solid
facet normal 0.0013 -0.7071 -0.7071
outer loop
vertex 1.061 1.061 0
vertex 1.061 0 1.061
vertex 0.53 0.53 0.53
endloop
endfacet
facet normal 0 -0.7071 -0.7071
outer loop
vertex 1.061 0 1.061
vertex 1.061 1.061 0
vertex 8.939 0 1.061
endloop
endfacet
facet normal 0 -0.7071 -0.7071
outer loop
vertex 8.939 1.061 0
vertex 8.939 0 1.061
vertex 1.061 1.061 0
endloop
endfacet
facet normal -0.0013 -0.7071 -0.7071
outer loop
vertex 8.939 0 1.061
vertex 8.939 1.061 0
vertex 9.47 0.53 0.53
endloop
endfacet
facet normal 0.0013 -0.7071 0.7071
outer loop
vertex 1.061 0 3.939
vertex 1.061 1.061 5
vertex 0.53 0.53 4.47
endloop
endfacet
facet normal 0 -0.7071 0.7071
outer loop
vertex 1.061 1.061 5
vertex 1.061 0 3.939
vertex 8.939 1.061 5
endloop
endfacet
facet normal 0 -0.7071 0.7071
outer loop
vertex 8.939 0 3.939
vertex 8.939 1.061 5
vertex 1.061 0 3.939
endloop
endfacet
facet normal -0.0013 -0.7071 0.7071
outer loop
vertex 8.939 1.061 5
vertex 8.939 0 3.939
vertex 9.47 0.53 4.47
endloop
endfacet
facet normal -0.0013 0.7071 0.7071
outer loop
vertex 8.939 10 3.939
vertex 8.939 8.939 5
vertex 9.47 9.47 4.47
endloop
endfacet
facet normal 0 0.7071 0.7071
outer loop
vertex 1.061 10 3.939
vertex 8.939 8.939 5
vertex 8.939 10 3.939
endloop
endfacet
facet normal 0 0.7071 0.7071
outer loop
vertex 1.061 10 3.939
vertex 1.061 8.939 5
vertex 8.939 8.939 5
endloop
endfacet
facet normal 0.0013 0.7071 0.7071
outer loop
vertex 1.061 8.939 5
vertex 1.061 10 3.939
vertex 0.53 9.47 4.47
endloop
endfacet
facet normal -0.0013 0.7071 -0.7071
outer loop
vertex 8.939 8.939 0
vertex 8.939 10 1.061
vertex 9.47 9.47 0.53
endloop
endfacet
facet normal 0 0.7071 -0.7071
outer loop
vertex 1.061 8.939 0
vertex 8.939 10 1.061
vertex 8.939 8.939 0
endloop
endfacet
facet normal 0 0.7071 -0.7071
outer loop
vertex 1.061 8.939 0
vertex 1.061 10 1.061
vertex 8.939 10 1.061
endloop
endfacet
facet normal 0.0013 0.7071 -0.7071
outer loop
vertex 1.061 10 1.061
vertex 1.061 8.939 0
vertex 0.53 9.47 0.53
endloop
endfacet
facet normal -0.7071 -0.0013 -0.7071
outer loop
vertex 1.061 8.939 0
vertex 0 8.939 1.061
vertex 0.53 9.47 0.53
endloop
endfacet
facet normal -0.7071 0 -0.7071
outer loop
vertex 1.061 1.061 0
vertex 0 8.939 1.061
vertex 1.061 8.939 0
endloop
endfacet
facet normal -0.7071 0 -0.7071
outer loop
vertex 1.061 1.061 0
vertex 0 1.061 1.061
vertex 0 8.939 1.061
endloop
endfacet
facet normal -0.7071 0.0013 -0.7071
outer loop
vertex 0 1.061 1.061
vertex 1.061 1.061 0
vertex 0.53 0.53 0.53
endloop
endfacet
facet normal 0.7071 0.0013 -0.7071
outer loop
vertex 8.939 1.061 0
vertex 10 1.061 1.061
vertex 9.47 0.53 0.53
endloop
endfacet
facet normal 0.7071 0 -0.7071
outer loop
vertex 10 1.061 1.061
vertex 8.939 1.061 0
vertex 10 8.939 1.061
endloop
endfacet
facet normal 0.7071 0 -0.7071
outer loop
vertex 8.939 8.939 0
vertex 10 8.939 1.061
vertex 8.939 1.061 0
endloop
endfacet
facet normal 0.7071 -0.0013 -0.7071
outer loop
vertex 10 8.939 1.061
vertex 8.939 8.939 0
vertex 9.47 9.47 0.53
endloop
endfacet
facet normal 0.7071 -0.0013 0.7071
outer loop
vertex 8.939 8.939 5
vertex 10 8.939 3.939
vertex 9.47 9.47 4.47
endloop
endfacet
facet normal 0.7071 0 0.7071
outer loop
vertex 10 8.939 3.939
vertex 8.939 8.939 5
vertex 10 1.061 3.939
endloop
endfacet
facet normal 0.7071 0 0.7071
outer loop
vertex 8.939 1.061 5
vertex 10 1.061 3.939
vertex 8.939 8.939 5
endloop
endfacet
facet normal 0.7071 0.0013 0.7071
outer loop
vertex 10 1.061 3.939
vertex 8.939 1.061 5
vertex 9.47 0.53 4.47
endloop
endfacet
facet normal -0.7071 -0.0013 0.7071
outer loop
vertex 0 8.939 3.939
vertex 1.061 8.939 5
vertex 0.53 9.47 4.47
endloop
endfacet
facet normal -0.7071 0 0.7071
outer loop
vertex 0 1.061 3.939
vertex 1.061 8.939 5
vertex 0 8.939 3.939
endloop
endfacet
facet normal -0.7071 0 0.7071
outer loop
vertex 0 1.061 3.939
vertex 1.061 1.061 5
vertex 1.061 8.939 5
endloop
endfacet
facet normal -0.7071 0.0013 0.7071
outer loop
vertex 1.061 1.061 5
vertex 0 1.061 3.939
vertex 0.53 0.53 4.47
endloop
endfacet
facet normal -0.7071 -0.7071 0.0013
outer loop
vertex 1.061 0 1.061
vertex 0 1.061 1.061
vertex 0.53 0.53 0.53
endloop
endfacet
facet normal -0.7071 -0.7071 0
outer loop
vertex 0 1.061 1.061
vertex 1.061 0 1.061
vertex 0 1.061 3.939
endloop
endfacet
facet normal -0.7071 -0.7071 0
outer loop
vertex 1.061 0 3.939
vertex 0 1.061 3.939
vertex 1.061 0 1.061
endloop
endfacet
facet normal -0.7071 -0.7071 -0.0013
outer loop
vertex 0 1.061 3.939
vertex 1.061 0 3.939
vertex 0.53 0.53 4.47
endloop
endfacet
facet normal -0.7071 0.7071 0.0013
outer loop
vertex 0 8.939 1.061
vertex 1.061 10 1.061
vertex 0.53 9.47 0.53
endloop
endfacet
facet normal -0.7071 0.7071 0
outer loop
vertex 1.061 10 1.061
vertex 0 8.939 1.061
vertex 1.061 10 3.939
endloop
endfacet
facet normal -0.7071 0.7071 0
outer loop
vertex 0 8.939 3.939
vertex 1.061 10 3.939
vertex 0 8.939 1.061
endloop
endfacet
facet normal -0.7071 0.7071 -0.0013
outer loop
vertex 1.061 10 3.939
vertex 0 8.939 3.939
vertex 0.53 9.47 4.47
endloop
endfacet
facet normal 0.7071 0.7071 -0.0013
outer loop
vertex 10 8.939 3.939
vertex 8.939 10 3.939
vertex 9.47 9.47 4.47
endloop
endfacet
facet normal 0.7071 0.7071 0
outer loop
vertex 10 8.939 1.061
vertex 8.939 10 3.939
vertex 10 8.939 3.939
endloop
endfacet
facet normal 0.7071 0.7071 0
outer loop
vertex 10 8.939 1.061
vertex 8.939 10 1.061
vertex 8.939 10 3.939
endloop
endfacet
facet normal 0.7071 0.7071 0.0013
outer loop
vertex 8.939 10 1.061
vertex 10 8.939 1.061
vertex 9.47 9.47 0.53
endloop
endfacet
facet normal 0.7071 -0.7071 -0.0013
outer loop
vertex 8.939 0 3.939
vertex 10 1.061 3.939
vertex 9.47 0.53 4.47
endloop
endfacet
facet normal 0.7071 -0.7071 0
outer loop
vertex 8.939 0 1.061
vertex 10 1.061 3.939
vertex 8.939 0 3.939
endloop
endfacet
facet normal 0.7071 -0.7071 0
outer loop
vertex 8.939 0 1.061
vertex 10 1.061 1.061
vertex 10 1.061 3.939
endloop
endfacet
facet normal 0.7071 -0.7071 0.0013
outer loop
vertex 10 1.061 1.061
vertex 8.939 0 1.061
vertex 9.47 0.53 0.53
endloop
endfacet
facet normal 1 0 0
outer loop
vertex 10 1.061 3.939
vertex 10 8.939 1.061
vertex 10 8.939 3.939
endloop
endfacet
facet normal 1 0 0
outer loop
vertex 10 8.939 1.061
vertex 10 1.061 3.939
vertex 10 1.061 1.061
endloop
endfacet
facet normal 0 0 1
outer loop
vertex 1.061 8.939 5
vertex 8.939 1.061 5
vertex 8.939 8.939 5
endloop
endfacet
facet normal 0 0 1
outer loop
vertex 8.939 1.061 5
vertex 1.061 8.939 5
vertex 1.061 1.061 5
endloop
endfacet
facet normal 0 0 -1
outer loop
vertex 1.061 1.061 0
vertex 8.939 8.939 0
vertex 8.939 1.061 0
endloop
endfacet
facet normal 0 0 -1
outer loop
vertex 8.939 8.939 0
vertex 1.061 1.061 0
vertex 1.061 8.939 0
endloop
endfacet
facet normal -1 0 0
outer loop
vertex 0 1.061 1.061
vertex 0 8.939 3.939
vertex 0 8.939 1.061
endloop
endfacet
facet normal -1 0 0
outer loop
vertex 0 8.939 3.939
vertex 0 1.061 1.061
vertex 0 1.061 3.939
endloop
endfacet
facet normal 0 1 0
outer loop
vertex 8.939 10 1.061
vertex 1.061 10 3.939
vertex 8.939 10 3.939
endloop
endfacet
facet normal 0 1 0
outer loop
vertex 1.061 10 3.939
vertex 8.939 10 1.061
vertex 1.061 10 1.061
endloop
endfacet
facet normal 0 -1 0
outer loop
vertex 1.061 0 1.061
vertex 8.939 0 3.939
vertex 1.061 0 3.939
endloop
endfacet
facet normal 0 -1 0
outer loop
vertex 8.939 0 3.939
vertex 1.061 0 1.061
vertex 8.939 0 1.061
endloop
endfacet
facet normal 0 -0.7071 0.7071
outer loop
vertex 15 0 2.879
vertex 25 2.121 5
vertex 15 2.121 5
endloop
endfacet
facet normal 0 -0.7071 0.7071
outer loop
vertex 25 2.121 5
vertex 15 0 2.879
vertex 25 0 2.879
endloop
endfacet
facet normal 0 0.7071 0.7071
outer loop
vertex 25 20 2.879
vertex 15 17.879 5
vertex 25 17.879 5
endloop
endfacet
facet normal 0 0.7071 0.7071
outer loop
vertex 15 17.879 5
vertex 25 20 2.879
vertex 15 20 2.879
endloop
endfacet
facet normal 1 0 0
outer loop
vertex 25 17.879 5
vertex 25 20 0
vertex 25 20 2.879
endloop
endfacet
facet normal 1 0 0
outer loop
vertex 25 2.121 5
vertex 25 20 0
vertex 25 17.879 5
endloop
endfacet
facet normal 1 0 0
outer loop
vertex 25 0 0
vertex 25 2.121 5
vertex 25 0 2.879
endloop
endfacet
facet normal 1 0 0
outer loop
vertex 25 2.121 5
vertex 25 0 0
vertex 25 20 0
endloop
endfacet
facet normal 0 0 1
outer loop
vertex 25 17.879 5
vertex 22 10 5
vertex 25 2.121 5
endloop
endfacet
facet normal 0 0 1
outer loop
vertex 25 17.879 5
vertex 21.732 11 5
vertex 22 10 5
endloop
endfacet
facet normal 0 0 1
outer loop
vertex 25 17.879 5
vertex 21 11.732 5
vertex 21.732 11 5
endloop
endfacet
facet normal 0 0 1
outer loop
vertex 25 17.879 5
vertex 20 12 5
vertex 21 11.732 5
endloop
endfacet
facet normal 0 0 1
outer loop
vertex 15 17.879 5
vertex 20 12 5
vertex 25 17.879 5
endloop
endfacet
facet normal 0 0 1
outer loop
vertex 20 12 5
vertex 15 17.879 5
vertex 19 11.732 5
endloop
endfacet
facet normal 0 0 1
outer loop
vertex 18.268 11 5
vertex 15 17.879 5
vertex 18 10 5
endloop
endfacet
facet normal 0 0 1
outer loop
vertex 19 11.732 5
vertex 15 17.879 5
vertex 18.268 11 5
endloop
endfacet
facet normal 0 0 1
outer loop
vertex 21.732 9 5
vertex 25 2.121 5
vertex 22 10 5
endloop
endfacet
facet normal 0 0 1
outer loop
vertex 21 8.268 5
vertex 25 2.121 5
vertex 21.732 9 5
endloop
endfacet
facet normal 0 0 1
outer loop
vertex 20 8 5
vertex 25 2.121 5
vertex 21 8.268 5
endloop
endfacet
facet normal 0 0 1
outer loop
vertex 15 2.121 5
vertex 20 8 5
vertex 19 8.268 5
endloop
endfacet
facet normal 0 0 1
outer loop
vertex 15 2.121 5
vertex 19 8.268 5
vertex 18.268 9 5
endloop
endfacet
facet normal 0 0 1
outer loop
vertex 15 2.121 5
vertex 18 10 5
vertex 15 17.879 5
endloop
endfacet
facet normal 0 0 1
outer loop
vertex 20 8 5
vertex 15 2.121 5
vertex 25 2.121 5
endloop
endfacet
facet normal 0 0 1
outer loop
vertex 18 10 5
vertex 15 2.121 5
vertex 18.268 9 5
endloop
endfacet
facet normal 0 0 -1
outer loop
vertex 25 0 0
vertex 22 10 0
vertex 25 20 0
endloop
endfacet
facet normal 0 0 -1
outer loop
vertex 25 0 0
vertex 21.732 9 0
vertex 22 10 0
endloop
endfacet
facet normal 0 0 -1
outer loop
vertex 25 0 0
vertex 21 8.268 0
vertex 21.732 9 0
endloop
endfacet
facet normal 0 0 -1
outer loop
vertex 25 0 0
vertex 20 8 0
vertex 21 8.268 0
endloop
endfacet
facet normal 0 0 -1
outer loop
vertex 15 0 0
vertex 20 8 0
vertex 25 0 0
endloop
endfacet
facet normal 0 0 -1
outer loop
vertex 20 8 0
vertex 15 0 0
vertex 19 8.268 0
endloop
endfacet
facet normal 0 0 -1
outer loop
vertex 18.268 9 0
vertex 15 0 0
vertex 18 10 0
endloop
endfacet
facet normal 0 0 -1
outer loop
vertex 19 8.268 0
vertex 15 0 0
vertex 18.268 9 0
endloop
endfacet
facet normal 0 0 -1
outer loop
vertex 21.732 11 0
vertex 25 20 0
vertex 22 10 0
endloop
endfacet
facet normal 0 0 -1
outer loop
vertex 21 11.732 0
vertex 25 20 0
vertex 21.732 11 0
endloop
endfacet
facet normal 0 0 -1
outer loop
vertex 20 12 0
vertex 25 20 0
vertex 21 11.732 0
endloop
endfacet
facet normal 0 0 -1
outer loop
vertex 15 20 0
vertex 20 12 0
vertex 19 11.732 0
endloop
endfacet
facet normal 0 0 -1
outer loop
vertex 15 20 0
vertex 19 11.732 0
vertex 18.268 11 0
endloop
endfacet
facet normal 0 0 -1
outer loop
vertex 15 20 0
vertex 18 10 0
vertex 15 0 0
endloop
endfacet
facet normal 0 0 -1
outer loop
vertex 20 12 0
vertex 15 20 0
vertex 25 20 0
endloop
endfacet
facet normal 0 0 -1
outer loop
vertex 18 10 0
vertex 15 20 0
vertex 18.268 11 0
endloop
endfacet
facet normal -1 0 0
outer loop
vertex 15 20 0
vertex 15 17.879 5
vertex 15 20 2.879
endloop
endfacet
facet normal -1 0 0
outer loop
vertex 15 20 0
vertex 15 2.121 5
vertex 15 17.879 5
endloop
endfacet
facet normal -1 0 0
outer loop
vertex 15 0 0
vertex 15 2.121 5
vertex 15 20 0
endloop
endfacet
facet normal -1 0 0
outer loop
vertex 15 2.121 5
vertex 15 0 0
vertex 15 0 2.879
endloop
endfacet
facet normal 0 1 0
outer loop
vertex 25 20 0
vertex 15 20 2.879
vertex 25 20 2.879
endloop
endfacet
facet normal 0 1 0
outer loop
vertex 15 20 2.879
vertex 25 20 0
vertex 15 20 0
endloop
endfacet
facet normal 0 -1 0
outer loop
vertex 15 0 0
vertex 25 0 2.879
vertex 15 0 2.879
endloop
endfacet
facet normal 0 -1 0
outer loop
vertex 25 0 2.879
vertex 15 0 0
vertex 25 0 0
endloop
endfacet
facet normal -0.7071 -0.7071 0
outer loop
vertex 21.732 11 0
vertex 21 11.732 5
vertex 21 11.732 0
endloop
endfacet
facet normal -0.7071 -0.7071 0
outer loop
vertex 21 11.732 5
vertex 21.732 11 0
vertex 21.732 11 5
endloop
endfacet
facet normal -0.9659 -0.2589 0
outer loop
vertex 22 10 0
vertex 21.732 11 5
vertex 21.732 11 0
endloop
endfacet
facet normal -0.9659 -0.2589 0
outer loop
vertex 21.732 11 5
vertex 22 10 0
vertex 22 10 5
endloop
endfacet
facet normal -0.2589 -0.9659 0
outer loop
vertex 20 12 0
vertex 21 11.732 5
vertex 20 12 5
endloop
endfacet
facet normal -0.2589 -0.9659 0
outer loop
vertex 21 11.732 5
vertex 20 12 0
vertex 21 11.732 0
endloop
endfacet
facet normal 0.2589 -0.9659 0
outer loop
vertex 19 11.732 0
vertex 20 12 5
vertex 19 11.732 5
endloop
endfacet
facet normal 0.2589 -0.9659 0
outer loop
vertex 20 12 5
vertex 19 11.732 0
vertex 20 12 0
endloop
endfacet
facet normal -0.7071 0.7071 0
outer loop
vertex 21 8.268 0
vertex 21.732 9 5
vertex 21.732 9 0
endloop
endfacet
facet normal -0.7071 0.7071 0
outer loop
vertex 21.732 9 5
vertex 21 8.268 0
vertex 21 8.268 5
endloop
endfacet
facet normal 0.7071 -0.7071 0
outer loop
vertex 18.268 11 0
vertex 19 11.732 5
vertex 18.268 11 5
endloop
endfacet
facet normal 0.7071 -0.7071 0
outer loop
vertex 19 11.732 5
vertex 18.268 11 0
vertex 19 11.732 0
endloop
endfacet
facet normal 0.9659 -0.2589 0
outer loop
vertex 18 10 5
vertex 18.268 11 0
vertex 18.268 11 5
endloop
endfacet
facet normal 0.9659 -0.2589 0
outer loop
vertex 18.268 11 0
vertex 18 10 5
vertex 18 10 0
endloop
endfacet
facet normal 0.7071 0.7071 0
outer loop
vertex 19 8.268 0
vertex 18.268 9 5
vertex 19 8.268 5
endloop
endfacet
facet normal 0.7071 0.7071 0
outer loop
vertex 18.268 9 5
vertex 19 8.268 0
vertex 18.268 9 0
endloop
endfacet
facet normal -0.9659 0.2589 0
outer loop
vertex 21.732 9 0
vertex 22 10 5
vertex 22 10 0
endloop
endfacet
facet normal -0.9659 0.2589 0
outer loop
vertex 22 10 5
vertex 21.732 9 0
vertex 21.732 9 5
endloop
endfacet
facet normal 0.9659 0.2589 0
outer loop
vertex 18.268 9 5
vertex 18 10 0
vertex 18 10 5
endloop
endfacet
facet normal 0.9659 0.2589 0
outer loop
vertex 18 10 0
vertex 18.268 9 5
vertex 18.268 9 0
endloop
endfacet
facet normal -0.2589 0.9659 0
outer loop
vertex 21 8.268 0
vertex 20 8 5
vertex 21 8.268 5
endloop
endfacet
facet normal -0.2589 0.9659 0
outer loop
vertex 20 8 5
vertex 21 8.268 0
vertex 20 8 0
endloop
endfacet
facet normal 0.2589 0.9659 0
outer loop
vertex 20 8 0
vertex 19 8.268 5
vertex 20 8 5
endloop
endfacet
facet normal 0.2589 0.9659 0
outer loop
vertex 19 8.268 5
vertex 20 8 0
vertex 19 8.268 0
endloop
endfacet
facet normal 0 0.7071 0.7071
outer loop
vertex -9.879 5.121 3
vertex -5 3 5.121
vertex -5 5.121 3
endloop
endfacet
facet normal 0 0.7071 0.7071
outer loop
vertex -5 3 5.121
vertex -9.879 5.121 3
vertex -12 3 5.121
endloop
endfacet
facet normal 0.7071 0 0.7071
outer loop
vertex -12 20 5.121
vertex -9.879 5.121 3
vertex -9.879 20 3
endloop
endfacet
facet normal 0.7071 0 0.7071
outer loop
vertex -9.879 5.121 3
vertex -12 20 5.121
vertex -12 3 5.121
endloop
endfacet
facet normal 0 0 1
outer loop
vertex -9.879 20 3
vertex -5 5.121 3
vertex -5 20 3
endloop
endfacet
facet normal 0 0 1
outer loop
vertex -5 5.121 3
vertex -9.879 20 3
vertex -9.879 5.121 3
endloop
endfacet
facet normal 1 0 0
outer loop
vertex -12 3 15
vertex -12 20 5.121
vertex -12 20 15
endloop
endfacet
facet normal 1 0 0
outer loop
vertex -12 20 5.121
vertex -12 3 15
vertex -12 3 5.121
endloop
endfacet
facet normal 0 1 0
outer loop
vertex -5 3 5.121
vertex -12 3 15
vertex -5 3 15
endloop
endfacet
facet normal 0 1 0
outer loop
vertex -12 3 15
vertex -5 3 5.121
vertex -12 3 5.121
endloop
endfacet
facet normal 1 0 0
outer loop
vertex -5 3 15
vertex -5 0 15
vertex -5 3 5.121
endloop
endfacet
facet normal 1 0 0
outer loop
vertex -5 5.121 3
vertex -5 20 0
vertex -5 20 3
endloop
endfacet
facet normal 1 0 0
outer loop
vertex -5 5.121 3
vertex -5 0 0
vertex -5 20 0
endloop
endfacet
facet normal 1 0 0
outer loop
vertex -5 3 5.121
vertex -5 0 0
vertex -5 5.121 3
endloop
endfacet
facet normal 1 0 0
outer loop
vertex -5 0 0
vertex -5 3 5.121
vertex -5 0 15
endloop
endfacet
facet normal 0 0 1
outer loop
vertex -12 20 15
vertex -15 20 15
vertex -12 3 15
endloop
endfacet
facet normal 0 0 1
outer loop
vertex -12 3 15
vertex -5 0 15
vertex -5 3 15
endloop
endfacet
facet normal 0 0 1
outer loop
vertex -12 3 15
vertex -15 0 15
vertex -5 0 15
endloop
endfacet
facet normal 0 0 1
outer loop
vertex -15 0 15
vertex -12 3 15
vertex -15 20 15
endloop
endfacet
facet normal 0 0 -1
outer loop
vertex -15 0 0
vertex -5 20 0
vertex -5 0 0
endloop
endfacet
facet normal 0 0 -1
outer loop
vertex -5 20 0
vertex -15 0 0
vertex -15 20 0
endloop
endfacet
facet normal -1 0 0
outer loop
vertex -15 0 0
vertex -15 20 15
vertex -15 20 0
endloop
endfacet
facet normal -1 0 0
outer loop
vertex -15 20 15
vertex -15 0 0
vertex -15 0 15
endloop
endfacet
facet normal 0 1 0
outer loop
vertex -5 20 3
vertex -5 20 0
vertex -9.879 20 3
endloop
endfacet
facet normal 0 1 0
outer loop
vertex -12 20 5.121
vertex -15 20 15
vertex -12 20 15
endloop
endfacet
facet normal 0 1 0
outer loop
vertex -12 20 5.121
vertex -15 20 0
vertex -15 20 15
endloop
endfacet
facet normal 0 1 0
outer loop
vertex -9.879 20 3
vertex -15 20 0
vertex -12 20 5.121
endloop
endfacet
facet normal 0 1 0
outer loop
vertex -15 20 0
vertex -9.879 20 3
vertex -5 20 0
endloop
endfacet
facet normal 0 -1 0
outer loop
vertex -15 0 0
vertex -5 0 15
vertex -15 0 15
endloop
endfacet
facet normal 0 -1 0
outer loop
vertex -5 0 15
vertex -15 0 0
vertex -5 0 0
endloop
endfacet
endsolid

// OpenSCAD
// -----------------
// module cubo
// GPL v2.0
// yvoz.lg@gmail.com
// -----------------

cubo([10,10,5], [1,2,3,4,5,6,7,8,9,10,11,12], 1.5);

translate([15, 0, 0]){
	difference(){
		cubo([10,20,5], [2,3], 3);
		translate([5,10,-1]) cylinder(r=2, h=7, $fn=12);
	}
}

translate([-15, 0, 0]){
	difference(){
		cube([10,20,15]);
		translate([3,3,3]) cubo([10,20,50], [1,5], 3);
	}
}

module cubo(dim, cro, a){

	diago = sqrt(pow(a,2)+pow(a,2));
	difference(){
		cube(dim);
		
		for(i=cro){
			//x
			if(i==1){
				translate([-1, 0, -diago/2])
				rotate([45, 0, 0])
				cube([dim.x+2, a, a]);
			}
			if(i==2){
				translate([-1, 0, dim.z-diago/2])
				rotate([45, 0, 0])
				cube([dim.x+2, a, a]);
			}
			if(i==3){
				translate([-1, dim.y, dim.z-diago/2])
				rotate([45, 0, 0])
				cube([dim.x+2, a, a]);
			}
			if(i==4){
				translate([-1, dim.y, -diago/2])
				rotate([45, 0, 0])
				cube([dim.x+2, a, a]);
			}
			//y
			if(i==5){
				translate([-diago/2, -1, 0])
				rotate([0, 45, 0])
				cube([a, dim.y+2, a]);
			}
			if(i==6){
				translate([dim.x-diago/2, -1, 0])
				rotate([0, 45, 0])
				cube([a, dim.y+2, a]);
			}
			if(i==7){
				translate([dim.x-diago/2, -1, dim.z])
				rotate([0, 45, 0])
				cube([a, dim.y+2, a]);
			}
			if(i==8){
				translate([-diago/2, -1, dim.z])
				rotate([0, 45, 0])
				cube([a, dim.y+2, a]);
			}
			//z
			if(i==9){
				translate([0, -diago/2, -1])
				rotate([0, 0, 45])
				cube([a, a, dim.z+2]);
			}
			if(i==10){
				translate([0, dim.y-diago/2, -1])
				rotate([0, 0, 45])
				cube([a, a, dim.z+2]);
			}
			if(i==11){
				translate([dim.x, dim.y-diago/2, -1])
				rotate([0, 0, 45])
				cube([a, a, dim.z+2]);
			}
			if(i==12){
				translate([dim.x, -diago/2, -1])
				rotate([0, 0, 45])
				cube([a, a, dim.z+2]);
			}
		}
	}
}
